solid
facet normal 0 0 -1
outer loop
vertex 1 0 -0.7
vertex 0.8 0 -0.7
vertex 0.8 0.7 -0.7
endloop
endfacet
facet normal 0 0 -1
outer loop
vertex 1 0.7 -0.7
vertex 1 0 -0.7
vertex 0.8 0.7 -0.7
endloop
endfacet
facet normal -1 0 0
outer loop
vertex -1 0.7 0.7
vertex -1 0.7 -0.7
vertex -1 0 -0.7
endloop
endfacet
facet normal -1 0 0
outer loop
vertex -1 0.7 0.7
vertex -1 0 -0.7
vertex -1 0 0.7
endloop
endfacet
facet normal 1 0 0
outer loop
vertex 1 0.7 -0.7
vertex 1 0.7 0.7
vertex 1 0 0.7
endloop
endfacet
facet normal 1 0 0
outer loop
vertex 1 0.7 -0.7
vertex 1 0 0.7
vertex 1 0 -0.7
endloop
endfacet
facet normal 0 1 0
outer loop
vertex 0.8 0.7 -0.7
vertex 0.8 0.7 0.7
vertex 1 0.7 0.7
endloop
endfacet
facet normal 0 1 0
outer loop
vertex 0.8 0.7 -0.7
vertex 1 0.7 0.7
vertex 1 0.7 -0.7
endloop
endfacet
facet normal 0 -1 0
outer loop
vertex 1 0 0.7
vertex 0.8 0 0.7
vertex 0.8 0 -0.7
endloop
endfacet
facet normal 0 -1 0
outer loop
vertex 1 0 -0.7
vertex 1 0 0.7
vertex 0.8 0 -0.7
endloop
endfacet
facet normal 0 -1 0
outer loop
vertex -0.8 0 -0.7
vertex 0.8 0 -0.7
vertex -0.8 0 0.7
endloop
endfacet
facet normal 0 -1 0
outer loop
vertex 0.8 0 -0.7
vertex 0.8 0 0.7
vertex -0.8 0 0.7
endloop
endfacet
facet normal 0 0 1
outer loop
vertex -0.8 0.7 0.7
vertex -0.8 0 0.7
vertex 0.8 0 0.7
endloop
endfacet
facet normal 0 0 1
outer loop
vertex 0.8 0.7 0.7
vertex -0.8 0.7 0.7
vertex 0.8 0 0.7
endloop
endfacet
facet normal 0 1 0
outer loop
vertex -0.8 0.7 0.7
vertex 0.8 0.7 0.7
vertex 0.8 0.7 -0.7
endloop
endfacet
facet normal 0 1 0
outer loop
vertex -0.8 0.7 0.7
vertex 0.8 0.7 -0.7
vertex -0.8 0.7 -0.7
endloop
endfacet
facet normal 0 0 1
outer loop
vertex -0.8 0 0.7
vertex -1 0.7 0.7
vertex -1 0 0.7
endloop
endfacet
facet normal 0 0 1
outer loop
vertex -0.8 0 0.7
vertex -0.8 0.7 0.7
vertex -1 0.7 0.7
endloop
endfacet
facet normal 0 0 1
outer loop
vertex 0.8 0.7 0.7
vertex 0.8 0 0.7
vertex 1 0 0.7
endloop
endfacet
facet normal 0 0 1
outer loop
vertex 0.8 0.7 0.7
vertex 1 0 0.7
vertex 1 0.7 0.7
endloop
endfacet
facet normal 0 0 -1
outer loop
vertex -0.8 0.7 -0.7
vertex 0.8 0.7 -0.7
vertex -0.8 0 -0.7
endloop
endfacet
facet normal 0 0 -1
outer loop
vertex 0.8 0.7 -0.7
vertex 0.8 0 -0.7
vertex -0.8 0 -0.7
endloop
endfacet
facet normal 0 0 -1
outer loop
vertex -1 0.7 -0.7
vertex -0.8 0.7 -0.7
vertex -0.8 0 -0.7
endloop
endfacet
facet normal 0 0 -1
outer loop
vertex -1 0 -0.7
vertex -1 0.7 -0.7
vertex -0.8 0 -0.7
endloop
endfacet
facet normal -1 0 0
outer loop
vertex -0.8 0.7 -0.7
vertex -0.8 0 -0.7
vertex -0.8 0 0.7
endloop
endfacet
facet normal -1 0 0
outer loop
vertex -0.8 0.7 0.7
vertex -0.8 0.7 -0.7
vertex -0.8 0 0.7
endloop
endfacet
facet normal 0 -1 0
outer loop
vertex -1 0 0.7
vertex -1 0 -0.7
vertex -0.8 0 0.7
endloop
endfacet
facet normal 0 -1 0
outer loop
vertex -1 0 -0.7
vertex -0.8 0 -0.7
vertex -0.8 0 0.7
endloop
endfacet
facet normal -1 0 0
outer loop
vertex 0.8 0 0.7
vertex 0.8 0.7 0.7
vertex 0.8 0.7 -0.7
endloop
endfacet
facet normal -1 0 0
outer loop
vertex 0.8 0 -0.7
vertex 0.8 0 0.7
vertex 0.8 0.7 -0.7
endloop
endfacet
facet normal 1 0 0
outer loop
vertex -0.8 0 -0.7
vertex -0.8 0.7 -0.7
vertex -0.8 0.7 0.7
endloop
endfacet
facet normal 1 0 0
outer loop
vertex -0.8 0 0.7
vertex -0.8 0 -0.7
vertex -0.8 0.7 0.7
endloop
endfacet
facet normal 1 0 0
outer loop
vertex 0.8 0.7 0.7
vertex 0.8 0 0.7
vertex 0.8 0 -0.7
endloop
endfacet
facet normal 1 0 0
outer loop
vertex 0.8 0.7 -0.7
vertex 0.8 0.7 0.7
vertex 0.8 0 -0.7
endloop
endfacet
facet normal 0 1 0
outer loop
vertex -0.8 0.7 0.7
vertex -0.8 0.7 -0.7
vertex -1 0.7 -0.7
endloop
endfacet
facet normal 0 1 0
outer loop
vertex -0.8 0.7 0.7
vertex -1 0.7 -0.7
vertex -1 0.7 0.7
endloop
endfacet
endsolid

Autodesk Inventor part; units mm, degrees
ref_plane "YZ Plane" through (0, 0, 0) normal (1, 0, 0) x (0, 1, 0)
ref_plane "XZ Plane" through (0, 0, 0) normal (0, 1, 0) x (-1, 0, 0)
ref_plane "XY Plane" through (0, 0, 0) normal (0, 0, 1) x (1, 0, 0)
sketch "Sketch1" plane through (0, 0, 0) normal (0, 1, 0) x (-1, 0, 0)
  line L0 (0.8, 0.7) -> (-0.8, 0.7)
  line L1 (-0.8, 0.7) -> (-0.8, -0.7)
  line L2 (-0.8, -0.7) -> (0.8, -0.7)
  line L3 (0.8, -0.7) -> (0.8, 0.7)
  line L4 (0.8, 0.7) -> (-0.8, -0.7) construction
  line L5 (-0.8, 0.7) -> (0.8, -0.7) construction
  point P0 (0, 0)
  dimension "d0" = 1.4
  dimension "d1" = 1.6
extrude "Extrusion1" add sketch "Sketch1" along normal blind 0.7
sketch "Sketch2" plane through (0.8, 0, 0.7) normal (1, 0, 0) x (0, 0, -1)
  line L0 (0, 0) -> (1.4, 0) projected
  line L1 (1.4, 0) -> (1.4, 0.7) projected
  line L2 (0, 0.7) -> (1.4, 0.7) projected
  line L3 (0, 0) -> (0, 0.7) projected
  point P0 (0.7, 0)
extrude "Extrusion2" add sketch "Sketch2" along normal blind 0.2 separate body
mirror "Mirror1" about plane through (0, 0, 0) normal (1, 0, 0) of "Extrusion2" bodies 2
sketch "Sketch3" plane through (0, 0.7, 0) normal (0, 1, 0) x (1, 0, 0)
  line L0 (-0.809, 0.2813) -> (2.4608, 0.2813) construction
  line L1 (2.4608, 0.2813) -> (2.4608, -0.6207) construction
  line L2 (2.4608, -0.6207) -> (-0.809, -0.6207) construction
  line L3 (-0.809, -0.6207) -> (-0.809, 0.2813) construction
  point P0 (0, 0)
